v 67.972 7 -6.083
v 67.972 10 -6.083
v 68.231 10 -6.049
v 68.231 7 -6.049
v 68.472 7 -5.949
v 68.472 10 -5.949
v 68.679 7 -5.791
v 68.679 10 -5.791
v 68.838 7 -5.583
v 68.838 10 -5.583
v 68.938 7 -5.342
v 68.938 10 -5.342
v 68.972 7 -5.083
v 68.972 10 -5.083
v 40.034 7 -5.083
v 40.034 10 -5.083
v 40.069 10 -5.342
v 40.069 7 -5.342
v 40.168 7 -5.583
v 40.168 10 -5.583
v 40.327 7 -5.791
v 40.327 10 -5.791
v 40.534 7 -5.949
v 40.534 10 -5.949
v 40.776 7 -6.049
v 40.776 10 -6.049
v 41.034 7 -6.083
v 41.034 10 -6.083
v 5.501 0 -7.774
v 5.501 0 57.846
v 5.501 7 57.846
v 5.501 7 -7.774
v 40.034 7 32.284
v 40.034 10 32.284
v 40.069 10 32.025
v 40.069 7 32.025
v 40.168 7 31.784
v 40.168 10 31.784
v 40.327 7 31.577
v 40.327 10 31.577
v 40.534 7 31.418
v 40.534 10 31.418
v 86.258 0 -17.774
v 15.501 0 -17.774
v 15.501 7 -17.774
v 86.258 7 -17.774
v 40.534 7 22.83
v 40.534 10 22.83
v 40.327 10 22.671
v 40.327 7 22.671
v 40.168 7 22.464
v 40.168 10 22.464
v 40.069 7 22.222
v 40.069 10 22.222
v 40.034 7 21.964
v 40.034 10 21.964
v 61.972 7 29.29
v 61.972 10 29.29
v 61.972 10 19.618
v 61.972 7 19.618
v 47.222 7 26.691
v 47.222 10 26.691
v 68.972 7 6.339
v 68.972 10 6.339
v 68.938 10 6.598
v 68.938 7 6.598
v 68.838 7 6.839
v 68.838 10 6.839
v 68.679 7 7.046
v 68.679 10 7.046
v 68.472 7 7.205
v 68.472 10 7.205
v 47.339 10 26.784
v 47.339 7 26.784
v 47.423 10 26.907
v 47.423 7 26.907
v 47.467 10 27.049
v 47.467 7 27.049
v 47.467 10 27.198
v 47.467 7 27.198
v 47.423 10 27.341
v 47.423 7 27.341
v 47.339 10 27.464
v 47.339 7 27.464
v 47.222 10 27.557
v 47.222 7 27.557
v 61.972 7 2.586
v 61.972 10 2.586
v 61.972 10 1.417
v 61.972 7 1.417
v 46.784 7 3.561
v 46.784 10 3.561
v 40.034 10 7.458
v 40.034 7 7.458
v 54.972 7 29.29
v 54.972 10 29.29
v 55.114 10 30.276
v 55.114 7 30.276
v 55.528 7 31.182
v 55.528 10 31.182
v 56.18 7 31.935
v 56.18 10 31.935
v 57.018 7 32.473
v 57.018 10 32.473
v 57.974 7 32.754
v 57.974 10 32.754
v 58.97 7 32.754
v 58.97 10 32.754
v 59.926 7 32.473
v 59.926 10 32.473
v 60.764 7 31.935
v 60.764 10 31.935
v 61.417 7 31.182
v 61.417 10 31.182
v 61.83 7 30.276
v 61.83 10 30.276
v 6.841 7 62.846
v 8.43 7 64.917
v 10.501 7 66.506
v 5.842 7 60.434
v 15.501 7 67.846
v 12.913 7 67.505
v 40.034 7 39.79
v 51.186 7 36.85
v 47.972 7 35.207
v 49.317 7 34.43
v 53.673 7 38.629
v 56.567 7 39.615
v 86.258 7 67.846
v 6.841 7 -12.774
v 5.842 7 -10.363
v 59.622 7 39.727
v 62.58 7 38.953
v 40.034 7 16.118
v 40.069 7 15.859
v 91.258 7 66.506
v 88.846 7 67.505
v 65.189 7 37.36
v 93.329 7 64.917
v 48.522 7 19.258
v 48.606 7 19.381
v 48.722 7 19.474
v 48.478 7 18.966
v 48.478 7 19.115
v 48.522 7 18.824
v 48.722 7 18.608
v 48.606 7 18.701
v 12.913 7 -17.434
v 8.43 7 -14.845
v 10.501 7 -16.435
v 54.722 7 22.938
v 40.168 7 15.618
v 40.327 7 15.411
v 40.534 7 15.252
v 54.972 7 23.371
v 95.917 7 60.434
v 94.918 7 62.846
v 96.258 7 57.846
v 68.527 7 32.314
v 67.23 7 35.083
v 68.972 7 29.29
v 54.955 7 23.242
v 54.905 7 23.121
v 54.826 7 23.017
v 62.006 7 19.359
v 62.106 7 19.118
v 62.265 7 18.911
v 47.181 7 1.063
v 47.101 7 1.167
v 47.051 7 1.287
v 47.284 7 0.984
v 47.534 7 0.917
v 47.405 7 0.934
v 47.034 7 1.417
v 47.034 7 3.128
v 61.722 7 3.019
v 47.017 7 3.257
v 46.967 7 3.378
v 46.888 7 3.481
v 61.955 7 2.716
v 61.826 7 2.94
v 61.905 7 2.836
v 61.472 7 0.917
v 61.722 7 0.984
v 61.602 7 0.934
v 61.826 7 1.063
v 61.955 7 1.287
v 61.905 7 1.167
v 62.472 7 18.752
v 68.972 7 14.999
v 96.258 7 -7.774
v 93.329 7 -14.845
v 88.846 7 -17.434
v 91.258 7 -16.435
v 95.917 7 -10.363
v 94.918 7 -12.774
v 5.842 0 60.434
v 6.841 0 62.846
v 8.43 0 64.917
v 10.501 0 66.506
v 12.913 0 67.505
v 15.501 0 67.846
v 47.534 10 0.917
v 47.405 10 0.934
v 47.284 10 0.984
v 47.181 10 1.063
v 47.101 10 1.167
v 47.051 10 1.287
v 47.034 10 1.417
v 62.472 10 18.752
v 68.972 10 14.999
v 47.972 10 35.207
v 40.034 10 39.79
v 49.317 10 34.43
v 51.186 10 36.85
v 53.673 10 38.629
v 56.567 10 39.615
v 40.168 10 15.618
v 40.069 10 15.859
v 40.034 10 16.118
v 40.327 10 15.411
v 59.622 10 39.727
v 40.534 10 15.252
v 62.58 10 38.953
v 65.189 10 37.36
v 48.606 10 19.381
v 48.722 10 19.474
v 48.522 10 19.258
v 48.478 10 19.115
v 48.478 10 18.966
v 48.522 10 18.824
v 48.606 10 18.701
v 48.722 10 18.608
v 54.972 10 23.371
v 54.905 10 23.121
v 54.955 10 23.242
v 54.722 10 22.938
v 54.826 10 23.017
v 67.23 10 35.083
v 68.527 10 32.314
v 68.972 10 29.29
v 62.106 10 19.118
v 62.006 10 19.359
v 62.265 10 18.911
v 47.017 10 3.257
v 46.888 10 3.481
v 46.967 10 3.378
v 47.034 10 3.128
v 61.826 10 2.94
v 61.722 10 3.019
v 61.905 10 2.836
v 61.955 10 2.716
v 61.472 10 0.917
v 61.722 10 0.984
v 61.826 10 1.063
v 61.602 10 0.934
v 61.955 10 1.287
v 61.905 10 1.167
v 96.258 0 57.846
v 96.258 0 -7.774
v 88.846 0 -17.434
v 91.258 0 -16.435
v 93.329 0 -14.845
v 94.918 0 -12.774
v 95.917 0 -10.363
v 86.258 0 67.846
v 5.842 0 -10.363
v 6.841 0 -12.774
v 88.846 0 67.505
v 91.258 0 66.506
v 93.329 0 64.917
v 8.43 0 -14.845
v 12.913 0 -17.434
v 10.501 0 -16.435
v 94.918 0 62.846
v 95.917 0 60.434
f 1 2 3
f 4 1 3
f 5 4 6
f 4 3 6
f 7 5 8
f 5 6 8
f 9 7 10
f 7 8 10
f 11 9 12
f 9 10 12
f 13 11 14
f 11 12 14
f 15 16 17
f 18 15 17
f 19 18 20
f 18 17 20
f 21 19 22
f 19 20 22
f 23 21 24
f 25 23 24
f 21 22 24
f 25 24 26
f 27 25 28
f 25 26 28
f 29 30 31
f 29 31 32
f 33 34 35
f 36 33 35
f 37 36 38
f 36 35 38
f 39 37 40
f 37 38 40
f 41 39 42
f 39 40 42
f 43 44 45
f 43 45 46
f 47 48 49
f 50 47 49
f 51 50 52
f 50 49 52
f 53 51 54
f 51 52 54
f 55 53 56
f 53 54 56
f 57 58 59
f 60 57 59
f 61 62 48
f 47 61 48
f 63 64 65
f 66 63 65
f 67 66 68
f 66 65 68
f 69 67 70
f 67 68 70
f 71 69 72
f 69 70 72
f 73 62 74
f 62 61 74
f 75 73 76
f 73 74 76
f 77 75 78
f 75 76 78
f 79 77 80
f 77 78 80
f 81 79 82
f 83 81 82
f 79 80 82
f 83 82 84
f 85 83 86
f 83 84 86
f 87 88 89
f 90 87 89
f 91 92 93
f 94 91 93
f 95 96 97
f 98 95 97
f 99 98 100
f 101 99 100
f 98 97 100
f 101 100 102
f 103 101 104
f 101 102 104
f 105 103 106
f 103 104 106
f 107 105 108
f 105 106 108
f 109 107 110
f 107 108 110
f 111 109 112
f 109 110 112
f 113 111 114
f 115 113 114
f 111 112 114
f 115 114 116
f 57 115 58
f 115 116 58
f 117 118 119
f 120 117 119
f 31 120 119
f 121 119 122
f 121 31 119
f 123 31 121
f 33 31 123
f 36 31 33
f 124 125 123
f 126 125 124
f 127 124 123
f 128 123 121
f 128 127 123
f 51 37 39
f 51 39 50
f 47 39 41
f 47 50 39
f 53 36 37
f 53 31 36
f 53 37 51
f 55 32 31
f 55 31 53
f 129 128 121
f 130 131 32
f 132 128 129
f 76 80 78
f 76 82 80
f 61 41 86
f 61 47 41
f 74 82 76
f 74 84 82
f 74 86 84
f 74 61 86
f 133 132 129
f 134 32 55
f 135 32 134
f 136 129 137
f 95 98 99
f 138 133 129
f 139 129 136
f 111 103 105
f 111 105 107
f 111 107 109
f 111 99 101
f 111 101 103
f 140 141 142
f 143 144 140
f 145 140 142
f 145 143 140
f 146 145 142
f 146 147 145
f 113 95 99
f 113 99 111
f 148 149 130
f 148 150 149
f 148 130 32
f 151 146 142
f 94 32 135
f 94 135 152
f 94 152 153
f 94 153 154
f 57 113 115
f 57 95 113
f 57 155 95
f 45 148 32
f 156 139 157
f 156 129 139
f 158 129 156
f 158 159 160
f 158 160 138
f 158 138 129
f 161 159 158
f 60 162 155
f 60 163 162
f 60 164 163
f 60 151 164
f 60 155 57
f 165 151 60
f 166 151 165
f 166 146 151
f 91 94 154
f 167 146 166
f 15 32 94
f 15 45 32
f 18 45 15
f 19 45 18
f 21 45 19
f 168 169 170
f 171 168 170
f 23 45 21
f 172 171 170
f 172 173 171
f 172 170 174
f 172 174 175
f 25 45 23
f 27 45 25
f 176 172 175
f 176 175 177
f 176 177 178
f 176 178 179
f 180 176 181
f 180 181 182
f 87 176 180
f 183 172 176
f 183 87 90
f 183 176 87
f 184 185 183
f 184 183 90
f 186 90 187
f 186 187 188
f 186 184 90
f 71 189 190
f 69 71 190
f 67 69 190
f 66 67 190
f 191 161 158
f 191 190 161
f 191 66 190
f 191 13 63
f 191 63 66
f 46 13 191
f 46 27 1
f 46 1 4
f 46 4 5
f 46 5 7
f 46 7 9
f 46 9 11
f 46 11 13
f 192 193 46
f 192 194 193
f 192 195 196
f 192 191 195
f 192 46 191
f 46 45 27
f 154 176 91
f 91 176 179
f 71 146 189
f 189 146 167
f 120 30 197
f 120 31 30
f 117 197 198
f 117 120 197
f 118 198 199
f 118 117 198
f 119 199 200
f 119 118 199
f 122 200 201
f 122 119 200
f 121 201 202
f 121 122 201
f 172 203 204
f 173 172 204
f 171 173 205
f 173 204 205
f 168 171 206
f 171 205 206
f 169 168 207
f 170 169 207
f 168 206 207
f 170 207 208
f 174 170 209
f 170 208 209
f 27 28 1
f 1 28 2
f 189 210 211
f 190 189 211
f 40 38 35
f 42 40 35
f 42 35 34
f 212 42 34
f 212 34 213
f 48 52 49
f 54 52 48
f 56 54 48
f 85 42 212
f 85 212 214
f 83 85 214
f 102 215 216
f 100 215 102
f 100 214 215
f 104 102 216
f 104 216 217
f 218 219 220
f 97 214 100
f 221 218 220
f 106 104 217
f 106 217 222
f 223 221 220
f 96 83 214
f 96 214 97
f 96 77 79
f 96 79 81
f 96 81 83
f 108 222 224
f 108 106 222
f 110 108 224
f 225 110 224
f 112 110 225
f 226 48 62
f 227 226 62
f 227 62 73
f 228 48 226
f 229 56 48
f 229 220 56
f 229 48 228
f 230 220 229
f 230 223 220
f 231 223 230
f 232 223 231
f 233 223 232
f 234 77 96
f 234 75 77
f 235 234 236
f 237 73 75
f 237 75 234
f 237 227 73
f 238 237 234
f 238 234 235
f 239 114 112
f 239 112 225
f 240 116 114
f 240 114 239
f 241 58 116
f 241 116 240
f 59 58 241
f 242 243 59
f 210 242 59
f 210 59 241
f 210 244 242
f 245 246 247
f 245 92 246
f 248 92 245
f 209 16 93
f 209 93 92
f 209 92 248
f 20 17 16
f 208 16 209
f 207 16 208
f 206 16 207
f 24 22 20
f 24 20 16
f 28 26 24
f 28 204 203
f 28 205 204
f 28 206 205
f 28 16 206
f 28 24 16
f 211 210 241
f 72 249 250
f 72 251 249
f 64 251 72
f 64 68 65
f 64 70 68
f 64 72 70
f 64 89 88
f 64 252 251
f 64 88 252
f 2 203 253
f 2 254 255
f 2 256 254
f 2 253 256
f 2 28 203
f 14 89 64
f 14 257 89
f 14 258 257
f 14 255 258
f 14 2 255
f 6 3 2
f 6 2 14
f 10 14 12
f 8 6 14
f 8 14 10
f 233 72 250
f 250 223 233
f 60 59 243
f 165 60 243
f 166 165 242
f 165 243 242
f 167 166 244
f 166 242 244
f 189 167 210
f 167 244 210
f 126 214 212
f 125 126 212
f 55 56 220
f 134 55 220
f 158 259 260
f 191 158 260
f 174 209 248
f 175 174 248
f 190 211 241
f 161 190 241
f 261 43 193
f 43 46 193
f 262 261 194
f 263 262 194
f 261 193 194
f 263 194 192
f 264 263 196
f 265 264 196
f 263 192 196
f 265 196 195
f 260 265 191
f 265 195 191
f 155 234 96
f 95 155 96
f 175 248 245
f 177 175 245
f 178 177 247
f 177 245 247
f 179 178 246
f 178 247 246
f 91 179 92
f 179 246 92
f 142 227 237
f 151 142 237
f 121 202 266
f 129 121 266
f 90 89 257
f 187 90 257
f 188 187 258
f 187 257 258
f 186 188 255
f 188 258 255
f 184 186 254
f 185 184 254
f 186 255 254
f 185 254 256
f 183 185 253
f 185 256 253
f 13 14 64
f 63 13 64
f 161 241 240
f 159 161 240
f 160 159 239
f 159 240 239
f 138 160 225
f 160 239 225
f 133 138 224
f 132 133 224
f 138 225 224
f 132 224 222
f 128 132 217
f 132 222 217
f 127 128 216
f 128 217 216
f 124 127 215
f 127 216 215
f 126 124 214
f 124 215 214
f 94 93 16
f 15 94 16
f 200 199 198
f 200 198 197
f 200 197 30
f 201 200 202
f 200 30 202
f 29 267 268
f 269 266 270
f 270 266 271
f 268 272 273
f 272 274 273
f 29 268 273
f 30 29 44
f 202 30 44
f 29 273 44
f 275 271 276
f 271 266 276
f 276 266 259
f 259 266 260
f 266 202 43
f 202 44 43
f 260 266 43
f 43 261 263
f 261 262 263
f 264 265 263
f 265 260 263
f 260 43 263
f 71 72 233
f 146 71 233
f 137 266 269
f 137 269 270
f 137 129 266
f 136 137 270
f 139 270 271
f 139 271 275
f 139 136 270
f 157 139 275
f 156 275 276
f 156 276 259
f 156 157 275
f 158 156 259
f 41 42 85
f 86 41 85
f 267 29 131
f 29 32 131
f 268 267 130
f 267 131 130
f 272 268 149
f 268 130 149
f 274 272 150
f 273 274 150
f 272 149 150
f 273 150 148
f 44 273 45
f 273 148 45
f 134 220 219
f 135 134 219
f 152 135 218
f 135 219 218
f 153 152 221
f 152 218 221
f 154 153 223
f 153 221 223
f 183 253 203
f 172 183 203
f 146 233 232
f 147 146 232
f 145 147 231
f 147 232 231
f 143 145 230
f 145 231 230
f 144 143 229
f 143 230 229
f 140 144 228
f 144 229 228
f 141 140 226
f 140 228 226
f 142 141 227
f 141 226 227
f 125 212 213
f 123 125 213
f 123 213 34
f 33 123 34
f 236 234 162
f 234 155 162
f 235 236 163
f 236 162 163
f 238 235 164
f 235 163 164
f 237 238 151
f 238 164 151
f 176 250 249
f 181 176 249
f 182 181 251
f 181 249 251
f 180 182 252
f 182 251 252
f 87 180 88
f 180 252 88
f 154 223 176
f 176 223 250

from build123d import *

# Parameters (mm, degrees)
SKETCH1_W           = 90.757028804
SKETCH1_H           = 85.620479834
BOSS_EXTRUDE1_DEPTH = 10
SKETCH2_W           = 90.757028804
SKETCH2_H           = 85.620479834
CUT_EXTRUDE1_DEPTH  = 3
FILLET3_R           = 10
FILLET4_R           = 0.5


with BuildPart() as part:
    # Sketch1 → Boss-Extrude1 (new body)
    with BuildSketch(Plane(origin=(0, 0, 0), x_dir=(1, 0, 0), z_dir=(0, 1, 0))):
        with Locations((50.879550114, -25.035867198)):
            Rectangle(SKETCH1_W, SKETCH1_H)
    extrude(amount=BOSS_EXTRUDE1_DEPTH)

    # Sketch2 → Cut-Extrude1 (cut)
    with BuildSketch(Plane(origin=(0, 10, 0), x_dir=(1, 0, 0), z_dir=(0, 1, 0))):
        with Locations((50.879550114, -25.035867198)):
            Rectangle(SKETCH2_W, SKETCH2_H)
        with BuildLine():
            ThreePointArc((67.972256686, 6.083430281), (68.679363467, 5.790537062), (68.972256686, 5.083430281))
            Line((68.972256686, 5.083430281), (68.972256686, -6.33921945))
            ThreePointArc((68.972256686, -6.33921945), (68.83828209, -6.83921945), (68.472256686, -7.205244854))
            Line((68.472256686, -7.205244854), (48.722256686, -18.60791267))
            ThreePointArc((48.722256686, -18.60791267), (48.472256686, -19.040925372), (48.722256686, -19.473938074))
            Line((48.722256686, -19.473938074), (54.972256686, -23.082377257))
            Line((54.972256686, -23.082377257), (54.972256686, -29.289636678))
            ThreePointArc((54.972256686, -29.289636678), (58.472256686, -32.789636678), (61.972256686, -29.289636678))
            Line((61.972256686, -29.289636678), (61.972256686, -19.618275642))
            ThreePointArc((61.972256686, -19.618275642), (62.106231282, -19.118275642), (62.472256686, -18.752250238))
            Line((62.472256686, -18.752250238), (68.972256686, -14.999473488))
            Line((68.972256686, -14.999473488), (68.972256686, -29.289636678))
            ThreePointArc((68.972256686, -29.289636678), (61.12912537, -39.447936181), (49.316818821, -34.430449599))
            Line((49.316818821, -34.430449599), (47.972256686, -35.20673291))
            Line((47.972256686, -35.20673291), (40.034434513, -39.789636678))
            Line((40.034434513, -39.789636678), (40.034434513, -32.284083179))
            ThreePointArc((40.034434513, -32.284083179), (40.168409109, -31.784083179), (40.534434513, -31.418057775))
            Line((40.534434513, -31.418057775), (47.972256686, -27.123829141))
            Line((47.972256686, -27.123829141), (40.534434513, -22.829600507))
            ThreePointArc((40.534434513, -22.829600507), (40.168409109, -22.463575103), (40.034434513, -21.963575103))
            Line((40.034434513, -21.963575103), (40.034434513, -16.118275642))
            ThreePointArc((40.034434513, -16.118275642), (40.168409109, -15.618275642), (40.534434513, -15.252250238))
            Line((40.534434513, -15.252250238), (61.722256686, -3.019455402))
            ThreePointArc((61.722256686, -3.019455402), (61.905269388, -2.8364427), (61.972256686, -2.5864427))
            Line((61.972256686, -2.5864427), (61.972256686, -1.416569719))
            ThreePointArc((61.972256686, -1.416569719), (61.825810077, -1.063016329), (61.472256686, -0.916569719))
            Line((61.472256686, -0.916569719), (47.534434513, -0.916569719))
            ThreePointArc((47.534434513, -0.916569719), (47.180881122, -1.063016329), (47.034434513, -1.416569719))
            Line((47.034434513, -1.416569719), (47.034434513, -3.127894585))
            ThreePointArc((47.034434513, -3.127894585), (46.967447214, -3.377894585), (46.784434513, -3.560907287))
            Line((46.784434513, -3.560907287), (40.034434513, -7.458021604))
            Line((40.034434513, -7.458021604), (40.034434513, -6.916569719))
            Line((40.034434513, -6.916569719), (40.034434513, 5.083430281))
            ThreePointArc((40.034434513, 5.083430281), (40.327327731, 5.790537062), (41.034434513, 6.083430281))
            Line((41.034434513, 6.083430281), (67.972256686, 6.083430281))
        make_face(mode=Mode.SUBTRACT)
    extrude(amount=-CUT_EXTRUDE1_DEPTH, mode=Mode.SUBTRACT)

    # Fillet3
    fillet3_edges = [part.edges().sort_by_distance(p)[0] for p in [
        (5.501035712, 3.5, -17.774372719),
        (96.258064516, 3.5, -17.774372719),
        (96.258064516, 3.5, 67.846107115),
        (5.501035712, 3.5, 67.846107115),
    ]]
    fillet(fillet3_edges, radius=FILLET3_R)

    # Fillet4
    fillet4_edges = [part.edges().sort_by_distance(p)[0] for p in [
        (47.972256686, 8.5, 27.123829141),
        (54.972256686, 8.5, 23.082377257),
    ]]
    fillet(fillet4_edges, radius=FILLET4_R)


solid = part.part
